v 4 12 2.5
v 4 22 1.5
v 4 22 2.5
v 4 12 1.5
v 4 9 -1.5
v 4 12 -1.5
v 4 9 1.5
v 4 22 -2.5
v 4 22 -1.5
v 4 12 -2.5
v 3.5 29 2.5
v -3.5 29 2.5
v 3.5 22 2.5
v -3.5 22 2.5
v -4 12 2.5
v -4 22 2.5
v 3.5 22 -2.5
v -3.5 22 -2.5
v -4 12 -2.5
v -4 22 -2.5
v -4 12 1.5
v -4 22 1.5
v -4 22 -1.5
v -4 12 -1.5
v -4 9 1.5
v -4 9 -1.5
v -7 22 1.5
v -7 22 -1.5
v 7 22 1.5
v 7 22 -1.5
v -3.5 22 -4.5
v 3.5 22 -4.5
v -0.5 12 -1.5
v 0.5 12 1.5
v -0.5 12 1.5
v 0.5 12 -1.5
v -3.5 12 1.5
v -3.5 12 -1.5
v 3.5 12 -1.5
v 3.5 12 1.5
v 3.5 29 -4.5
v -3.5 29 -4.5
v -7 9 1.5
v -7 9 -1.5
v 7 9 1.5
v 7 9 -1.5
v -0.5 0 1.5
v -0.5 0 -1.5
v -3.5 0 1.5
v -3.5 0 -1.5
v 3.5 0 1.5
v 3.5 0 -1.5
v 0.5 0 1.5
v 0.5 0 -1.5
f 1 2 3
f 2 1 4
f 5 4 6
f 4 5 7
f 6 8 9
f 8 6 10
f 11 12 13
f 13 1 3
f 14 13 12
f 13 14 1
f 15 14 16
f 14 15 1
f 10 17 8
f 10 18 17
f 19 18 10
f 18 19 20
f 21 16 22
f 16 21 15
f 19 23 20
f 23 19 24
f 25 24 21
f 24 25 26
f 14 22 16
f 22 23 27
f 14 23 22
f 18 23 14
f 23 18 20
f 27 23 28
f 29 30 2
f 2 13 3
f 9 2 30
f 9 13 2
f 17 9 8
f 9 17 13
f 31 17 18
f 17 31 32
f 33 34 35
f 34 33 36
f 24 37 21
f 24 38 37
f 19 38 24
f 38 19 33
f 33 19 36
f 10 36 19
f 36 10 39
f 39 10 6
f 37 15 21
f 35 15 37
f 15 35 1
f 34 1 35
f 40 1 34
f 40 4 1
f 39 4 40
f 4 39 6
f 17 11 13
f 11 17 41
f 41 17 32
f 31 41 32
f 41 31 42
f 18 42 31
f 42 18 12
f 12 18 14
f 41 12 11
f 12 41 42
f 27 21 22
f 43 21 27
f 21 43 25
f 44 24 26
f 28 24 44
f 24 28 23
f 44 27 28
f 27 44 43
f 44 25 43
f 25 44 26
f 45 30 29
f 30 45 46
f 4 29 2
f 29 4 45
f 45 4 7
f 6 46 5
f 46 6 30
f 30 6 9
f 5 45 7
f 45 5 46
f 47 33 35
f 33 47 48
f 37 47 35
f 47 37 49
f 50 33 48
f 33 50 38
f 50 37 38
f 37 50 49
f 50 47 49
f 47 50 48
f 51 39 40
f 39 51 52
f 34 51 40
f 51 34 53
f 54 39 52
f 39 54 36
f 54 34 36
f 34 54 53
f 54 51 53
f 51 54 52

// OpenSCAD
// file: lib.scad
// Voxcraft box-model library (OpenSCAD).
//
// Conventions: 1 unit = 1 texture pixel = 1/16 block. Origin = entity feet centre. +Y up,
// the model faces -Z (forward). Pivots are in model space.
//
// vx_bone() and vx_box() both produce geometry (so the model can be previewed/rendered and its
// geometry validated) AND echo a machine-readable record that tools/scad_export.py turns into
// the runtime box model. The .scad files are the single editable source of truth.

// Declare a bone: name, parent ("" = root), pivot point the bone rotates around.
module vx_bone(name, parent, pivot) {
    echo("VXBONE", name, parent, pivot);
    %translate(pivot) sphere(0.5, $fn = 6);   // preview-only marker
}

// A textured box attached to a bone. tex: texture for all faces; front: texture for the -Z face.
module vx_box(bone, min, size, tex, front = "") {
    echo("VXBOX", bone, min, size, tex, front == "" ? tex : front);
    translate(min) cube(size);
}
// main file
// Gloomling: a hunched night creature with lantern eyes; hates daylight. Original Voxcraft creature.
include <lib.scad>

vx_bone("body", "", [0, 12, 0]);
vx_bone("head", "body", [0, 22, -1]);
vx_bone("arm_l", "body", [-5.5, 21, 0]);
vx_bone("arm_r", "body", [ 5.5, 21, 0]);
vx_bone("leg_l", "body", [-2, 12, 0]);
vx_bone("leg_r", "body", [ 2, 12, 0]);

vx_box("body", [-4, 12, -2.5], [8, 10, 5], "gloomling_skin");
vx_box("head", [-3.5, 22, -4.5], [7, 7, 7], "gloomling_skin", "gloomling_face");
vx_box("arm_l", [-7, 9, -1.5], [3, 13, 3], "gloomling_skin");
vx_box("arm_r", [ 4, 9, -1.5], [3, 13, 3], "gloomling_skin");
vx_box("leg_l", [-3.5, 0, -1.5], [3, 12, 3], "gloomling_leg");
vx_box("leg_r", [ 0.5, 0, -1.5], [3, 12, 3], "gloomling_leg");
